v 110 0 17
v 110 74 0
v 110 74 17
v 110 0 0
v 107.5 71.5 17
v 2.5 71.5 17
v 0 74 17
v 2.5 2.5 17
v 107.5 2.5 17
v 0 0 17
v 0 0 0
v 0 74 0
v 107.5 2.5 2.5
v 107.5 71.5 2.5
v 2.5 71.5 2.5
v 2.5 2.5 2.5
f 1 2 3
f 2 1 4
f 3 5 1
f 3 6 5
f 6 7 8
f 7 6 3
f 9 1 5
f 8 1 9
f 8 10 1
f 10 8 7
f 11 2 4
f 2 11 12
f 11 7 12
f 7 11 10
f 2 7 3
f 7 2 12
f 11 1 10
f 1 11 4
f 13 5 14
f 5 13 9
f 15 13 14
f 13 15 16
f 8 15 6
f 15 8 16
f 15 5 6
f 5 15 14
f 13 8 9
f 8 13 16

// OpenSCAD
// file: ../../00_common/parameters.scad
// =============================================================================
// OpenMotorBridge - Global CAD Parameters & Settings
// =============================================================================
// File: hardware/cad/scad/00_common/parameters.scad
// Description: Global dimensional constants, manufacturing clearances and
//              circle resolution ($fn) for all OpenSCAD modules.
// =============================================================================

// --- 1. Circle & Curve Resolution ---
$fn = 60; // Smooth cylinders and holes for high-quality MJF 3D printing

// --- 2. Central Main Box Dimensions (3-Tier Sandwich) ---
MAIN_BOX_OUTER_L      = 110.0; // Outer length in X (mm)
MAIN_BOX_OUTER_W      = 74.0;  // Outer width in Y (mm)
MAIN_BOX_LOWER_H      = 17.0;  // Lower case height in Z (mm)
MAIN_BOX_MID_H        = 15.0;  // Mid tray height in Z (mm)
MAIN_BOX_LID_H        = 4.0;   // Lid plate thickness in Z (mm)
MAIN_BOX_WALL         = 2.5;   // Nominal wall thickness (mm)
MAIN_BOX_CORNER_POST  = 5.0;   // Corner clamping screw post size (mm)

// --- 3. Satellite Pod Dimensions (Universal 1-Pod Housing) ---
POD_OUTER_L           = 100.0; // Outer length in X (mm)
POD_OUTER_W           = 60.0;  // Outer width in Y (mm)
POD_OUTER_H           = 28.0;  // Outer height in Z (mm)
POD_WALL              = 2.5;   // Nominal wall thickness (mm)
POD_BULKHEAD_X        = 22.0;  // Partition bulkhead position in X (mm)
POD_CHAMBER_L         = 78.0;  // Sliding chamber length in X (mm)
POD_CHAMBER_W         = 55.0;  // Sliding chamber width in Y (mm)
POD_CHAMBER_H         = 23.0;  // Sliding chamber height in Z (mm)

// --- 4. Pod Linear Guide Rails (Poka-Yoke Tongue & Groove) ---
POD_GROOVE_W          = 3.0;   // Internal guide groove width in Z (mm)
POD_GROOVE_DEPTH      = 1.5;   // Internal guide groove depth in Y (mm)
POD_GROOVE_LEFT_Z     = 8.2;   // Center height of left groove (mm)
POD_GROOVE_RIGHT_Z    = 14.2;  // Center height of right groove (mm, asym offset)

CARTRIDGE_TONGUE_W    = 2.6;   // Cartridge tongue rail height in Z (mm, 0.2mm clearance)
CARTRIDGE_TONGUE_PROT = 1.4;   // Cartridge tongue protrusion in Y (mm, 0.1mm clearance)
CARTRIDGE_CHAMFER_L   = 4.0;   // 30° lead-in chamfer nose length (mm)

// --- 5. Cartridge Dimensions ---
CARTRIDGE_BASE_L      = 75.0;  // Sled length in X (mm)
CARTRIDGE_BASE_W      = 54.0;  // Sled width in Y (mm)
CARTRIDGE_BASE_H      = 20.5;  // Sled height in Z (mm)
CARTRIDGE_FACE_L      = 4.0;   // Front faceplate thickness in X (mm)
CARTRIDGE_FACE_W      = 58.0;  // Front faceplate width in Y (mm)
CARTRIDGE_FACE_H      = 25.0;  // Front faceplate height in Z (mm)

// --- 6. Thermal Copper Studs (Kühlbolzen) ---
COPPER_STUD_DIA       = 8.0;   // Diameter of thermal copper studs (mm)
COPPER_STUD_R         = COPPER_STUD_DIA / 2.0; // Radius = 4.0 mm

// Main Box Thermal Stud Positions (4x in lower case floor)
MAIN_BOX_CU_POS = [
    [35.0, 25.0], // Position 1 (LM5164 DCDC Buck Regulator)
    [45.0, 25.0], // Position 2 (BQ25798 LiPo Charger)
    [30.0, 48.0], // Position 3 (ESP32-S3 Dual-Core SoC)
    [70.0, 40.0]  // Position 4 (Automotive TVS & LC Filter Zone)
];

// Pod & Cartridge Thermal Stud Positions (2x in floor)
POD_CU_POS = [
    [42.0, 30.0], // Forward thermal zone
    [72.0, 30.0]  // Rearward thermal zone
];

// --- 7. Screw & Clearance Dimensions ---
M2_SCREW_HOLE_R       = 1.1;   // M2 clearance hole (r = 1.1 mm -> Ø 2.2 mm)
M2_5_SCREW_HOLE_R     = 1.4;   // M2.5 clearance hole (r = 1.4 mm -> Ø 2.8 mm)
M3_SCREW_HOLE_R       = 1.65;  // M3 clearance hole (r = 1.65 mm -> Ø 3.3 mm)
M4_SCREW_HOLE_R       = 2.2;   // M4 clearance hole (r = 2.2 mm -> Ø 4.4 mm)
M8_BORE_R             = 4.0;   // M8 cable through-bore (r = 4.0 mm -> Ø 8.0 mm)
M8_STUDS_OUTER_R      = 6.0;   // M8 neck outer radius (Ø 12.0 mm)
// main file
// =============================================================================
// OpenMotorBridge - Main Box: Lower Base Tub (Unterwanne Grundkörper)
// =============================================================================
// File: hardware/cad/scad/01_main_box/parts/000_lower_base.scad
// =============================================================================

include <../../00_common/parameters.scad>;

module main_box_lower_base(length=110.0, width=74.0, height=17.0, wall=2.5) {
    difference() {
        // Solid outer box
        cube(size=[length, width, height], center=false);
        // Hollow interior pocket
        translate([wall, wall, wall]) {
            cube(size=[length - 2*wall, width - 2*wall, height], center=false);
        }
    }
}

// Standalone preview
main_box_lower_base();
